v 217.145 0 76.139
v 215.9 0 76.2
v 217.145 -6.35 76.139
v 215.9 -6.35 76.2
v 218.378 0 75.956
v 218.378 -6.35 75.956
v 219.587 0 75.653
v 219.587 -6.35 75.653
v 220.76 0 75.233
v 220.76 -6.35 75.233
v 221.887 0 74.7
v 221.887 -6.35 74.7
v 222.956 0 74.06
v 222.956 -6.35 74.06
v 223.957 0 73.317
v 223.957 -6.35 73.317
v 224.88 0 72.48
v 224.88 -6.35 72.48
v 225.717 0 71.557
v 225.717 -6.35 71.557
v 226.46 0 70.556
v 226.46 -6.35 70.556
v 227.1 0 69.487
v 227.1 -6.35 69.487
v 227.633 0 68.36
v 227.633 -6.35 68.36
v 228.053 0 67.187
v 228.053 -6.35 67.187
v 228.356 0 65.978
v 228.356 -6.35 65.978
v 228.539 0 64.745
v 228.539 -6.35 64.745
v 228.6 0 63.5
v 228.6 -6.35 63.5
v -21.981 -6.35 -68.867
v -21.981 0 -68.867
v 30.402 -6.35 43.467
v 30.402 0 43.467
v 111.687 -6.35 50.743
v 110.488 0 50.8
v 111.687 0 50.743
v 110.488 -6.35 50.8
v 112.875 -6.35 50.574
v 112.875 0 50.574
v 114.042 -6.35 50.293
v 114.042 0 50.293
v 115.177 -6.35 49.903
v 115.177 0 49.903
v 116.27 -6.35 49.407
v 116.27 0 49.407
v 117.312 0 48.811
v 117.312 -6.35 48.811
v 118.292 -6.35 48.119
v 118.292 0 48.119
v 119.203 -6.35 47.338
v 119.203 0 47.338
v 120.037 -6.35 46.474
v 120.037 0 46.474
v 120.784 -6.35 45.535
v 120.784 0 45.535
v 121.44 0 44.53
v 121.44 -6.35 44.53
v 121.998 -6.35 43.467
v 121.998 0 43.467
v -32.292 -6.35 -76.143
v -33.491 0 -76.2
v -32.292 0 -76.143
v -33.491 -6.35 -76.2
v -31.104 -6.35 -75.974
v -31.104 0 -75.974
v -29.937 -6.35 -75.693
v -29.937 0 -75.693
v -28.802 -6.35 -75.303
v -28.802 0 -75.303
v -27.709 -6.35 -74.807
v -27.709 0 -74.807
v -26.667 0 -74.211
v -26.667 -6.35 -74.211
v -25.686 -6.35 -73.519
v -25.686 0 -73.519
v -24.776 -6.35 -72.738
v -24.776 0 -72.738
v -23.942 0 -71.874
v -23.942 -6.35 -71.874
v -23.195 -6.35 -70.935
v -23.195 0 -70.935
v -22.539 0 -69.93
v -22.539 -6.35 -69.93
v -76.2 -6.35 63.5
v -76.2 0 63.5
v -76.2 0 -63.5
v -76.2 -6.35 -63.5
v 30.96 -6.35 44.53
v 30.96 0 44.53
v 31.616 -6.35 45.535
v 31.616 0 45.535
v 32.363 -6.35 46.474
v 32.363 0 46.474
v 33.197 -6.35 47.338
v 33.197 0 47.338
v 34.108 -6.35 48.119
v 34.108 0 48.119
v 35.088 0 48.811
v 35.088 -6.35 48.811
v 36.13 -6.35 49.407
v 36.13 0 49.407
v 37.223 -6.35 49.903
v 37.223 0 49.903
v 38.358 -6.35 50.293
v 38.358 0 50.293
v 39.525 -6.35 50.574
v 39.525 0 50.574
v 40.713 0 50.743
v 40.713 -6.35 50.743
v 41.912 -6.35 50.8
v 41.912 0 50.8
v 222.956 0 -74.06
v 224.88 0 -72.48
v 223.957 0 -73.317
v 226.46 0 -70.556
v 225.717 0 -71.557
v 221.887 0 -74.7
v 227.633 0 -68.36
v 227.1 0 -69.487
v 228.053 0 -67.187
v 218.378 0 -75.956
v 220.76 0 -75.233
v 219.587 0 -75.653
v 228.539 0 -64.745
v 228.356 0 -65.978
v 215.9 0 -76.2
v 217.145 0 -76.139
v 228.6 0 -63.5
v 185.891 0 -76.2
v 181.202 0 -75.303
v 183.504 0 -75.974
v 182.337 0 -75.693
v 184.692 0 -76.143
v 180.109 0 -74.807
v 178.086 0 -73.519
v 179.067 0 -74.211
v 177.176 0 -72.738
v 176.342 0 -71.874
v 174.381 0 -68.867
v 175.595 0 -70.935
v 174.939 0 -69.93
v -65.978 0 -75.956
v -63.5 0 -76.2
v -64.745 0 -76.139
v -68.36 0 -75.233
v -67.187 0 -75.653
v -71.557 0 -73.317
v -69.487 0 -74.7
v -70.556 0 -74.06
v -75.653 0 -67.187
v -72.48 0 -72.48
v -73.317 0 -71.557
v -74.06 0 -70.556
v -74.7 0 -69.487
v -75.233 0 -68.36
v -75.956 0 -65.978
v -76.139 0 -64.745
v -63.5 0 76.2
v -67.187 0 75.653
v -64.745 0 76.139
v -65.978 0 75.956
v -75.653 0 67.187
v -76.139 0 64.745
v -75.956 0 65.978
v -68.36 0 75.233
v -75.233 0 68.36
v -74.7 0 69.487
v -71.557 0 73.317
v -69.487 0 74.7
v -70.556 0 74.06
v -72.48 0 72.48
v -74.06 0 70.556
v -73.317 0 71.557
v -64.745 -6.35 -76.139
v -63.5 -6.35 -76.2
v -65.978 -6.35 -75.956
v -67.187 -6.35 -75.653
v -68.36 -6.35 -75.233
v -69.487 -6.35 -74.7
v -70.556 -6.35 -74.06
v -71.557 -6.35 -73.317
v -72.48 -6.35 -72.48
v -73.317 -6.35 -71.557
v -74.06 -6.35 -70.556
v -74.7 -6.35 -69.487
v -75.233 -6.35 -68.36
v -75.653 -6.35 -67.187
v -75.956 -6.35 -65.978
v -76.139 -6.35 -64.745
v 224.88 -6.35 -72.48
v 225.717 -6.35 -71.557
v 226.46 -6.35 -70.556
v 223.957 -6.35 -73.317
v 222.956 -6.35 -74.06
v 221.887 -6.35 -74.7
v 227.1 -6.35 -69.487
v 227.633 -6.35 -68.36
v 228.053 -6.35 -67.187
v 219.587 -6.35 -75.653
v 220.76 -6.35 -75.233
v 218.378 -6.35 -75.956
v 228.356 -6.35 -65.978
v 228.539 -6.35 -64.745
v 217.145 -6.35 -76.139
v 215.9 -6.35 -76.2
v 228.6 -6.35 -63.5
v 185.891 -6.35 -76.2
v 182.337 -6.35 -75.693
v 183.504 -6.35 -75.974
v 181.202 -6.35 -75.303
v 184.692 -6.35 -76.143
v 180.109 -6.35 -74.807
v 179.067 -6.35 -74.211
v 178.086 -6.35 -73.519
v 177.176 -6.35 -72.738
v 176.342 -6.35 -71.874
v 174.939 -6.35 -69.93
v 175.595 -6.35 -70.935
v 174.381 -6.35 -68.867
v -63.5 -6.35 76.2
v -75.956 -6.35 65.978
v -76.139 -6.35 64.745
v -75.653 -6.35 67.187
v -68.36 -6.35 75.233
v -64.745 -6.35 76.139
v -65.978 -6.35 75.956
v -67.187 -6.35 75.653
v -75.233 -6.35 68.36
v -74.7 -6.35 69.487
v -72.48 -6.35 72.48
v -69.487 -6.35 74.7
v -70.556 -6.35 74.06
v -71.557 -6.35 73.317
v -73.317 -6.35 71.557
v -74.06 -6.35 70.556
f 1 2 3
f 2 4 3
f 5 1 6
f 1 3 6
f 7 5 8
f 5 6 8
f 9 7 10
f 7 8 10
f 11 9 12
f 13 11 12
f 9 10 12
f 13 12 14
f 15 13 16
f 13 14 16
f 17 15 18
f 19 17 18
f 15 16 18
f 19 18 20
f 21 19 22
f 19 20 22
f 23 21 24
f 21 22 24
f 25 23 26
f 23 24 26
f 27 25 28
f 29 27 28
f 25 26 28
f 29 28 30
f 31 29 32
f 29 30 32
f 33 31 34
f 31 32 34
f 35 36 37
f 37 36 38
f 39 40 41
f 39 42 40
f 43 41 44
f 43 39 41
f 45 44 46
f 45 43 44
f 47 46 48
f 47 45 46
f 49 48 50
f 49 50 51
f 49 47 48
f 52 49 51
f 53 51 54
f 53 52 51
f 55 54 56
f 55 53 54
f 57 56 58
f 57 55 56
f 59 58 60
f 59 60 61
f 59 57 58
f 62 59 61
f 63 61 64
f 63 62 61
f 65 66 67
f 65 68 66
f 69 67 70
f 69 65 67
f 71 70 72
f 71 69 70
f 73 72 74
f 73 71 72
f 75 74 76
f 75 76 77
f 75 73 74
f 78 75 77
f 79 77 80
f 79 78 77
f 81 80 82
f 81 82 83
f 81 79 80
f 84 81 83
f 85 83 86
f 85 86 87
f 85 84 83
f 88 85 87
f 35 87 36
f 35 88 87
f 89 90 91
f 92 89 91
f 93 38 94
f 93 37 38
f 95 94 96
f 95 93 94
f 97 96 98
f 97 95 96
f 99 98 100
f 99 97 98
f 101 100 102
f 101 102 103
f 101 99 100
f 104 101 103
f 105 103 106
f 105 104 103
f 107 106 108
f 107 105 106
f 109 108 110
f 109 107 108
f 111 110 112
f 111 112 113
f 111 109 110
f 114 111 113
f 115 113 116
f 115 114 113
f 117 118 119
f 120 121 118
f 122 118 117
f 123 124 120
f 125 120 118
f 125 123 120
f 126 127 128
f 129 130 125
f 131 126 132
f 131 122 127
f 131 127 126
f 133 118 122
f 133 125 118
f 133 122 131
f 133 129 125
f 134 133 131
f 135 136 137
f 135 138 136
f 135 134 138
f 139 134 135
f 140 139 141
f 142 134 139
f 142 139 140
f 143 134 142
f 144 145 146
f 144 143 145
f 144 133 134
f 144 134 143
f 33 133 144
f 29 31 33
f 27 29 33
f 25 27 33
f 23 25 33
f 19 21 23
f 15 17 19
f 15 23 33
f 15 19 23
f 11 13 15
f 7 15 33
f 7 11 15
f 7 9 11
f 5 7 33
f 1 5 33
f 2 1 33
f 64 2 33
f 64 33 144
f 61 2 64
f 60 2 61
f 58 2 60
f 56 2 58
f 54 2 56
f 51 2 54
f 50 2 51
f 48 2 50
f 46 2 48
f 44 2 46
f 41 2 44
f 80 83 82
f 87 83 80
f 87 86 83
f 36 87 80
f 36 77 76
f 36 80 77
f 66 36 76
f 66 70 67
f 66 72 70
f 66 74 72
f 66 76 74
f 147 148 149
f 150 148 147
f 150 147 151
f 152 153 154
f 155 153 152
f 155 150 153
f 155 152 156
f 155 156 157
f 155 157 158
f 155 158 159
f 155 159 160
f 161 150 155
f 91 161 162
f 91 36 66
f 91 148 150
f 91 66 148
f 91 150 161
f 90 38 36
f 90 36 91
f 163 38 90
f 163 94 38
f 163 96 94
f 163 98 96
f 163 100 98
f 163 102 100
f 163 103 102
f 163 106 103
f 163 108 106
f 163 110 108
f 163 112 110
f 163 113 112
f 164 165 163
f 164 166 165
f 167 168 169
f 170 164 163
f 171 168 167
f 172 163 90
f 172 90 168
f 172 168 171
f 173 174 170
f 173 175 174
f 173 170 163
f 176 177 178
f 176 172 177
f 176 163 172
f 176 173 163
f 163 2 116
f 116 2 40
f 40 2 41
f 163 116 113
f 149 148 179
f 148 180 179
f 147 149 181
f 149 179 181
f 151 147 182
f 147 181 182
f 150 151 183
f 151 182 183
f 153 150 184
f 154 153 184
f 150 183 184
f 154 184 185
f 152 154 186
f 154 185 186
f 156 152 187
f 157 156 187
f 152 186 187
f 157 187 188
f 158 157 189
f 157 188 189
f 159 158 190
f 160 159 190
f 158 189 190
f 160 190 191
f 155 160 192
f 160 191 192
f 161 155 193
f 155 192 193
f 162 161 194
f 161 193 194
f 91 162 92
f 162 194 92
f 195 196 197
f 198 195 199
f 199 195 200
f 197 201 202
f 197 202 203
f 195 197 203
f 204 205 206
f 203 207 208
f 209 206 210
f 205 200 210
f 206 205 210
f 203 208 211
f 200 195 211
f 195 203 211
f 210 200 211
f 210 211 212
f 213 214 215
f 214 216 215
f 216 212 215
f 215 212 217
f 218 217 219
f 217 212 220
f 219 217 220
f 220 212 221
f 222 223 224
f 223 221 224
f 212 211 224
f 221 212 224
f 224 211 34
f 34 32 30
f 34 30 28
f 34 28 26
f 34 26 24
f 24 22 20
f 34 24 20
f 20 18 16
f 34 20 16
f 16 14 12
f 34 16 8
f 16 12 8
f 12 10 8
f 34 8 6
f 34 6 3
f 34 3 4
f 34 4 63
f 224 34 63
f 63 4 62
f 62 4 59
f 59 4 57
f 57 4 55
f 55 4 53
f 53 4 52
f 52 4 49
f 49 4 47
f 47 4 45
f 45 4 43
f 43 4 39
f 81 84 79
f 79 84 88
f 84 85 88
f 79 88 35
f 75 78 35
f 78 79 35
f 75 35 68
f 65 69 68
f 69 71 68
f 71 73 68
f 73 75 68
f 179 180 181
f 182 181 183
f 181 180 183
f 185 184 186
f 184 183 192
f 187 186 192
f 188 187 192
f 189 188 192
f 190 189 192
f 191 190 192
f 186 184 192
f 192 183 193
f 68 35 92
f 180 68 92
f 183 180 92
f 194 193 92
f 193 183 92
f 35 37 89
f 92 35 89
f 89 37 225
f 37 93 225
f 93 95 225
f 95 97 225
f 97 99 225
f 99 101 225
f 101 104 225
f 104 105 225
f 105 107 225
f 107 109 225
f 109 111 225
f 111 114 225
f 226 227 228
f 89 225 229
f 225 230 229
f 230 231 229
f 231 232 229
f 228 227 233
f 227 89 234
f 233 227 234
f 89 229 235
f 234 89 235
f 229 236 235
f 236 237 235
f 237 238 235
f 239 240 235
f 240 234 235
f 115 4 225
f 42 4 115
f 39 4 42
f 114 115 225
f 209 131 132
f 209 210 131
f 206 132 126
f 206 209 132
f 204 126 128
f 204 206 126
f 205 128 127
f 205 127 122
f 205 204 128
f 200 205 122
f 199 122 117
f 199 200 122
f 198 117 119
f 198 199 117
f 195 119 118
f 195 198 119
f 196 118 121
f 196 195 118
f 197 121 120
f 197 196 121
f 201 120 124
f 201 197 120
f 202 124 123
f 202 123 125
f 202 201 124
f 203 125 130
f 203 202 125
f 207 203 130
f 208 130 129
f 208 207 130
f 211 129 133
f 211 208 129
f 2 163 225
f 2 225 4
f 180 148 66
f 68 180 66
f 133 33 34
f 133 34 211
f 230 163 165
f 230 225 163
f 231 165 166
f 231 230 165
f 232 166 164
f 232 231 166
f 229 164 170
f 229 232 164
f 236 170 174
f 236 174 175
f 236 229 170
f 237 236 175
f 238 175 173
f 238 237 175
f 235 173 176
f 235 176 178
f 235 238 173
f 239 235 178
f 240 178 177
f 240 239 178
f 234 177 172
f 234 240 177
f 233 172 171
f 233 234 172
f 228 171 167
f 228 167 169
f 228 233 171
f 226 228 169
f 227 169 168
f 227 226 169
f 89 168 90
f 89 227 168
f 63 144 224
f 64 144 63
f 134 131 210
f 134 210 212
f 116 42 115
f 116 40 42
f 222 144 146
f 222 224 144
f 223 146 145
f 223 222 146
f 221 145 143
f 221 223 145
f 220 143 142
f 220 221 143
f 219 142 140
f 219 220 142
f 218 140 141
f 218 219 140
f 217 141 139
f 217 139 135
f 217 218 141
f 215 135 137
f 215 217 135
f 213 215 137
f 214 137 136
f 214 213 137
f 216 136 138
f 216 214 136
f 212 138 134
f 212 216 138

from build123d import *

# Parameters (mm, degrees)
F1_DEPTH = 6.35
F3_R     = 12.7


with BuildPart() as f1:
    # F0 (on Front) → F1 (new body)
    with BuildSketch(Plane.XZ):
        Polygon((76.2, 76.2), (-76.2, 76.2), (-76.2, -76.2), (-25.4, -76.2), (33.8210725857, 50.8), (76.2, 50.8), align=None)
    extrude(amount=F1_DEPTH)

    # F2: F1 across face


with BuildPart() as f1_1:
    add(f1.part)
    add(f1.part.mirror(Plane(origin=(76.2, -3.175, 63.5), x_dir=(0, 1, 0), z_dir=(1, 0, 0))))

    # F3
    f3_edges = [f1_1.edges().sort_by_distance(p)[0] for p in [
        (33.821073, -3.175, 50.8),
        (118.578927, -3.175, 50.8),
        (177.8, -3.175, -76.2),
        (-25.4, -3.175, -76.2),
        (-76.2, -3.175, -76.2),
        (228.6, -3.175, -76.2),
        (228.6, -3.175, 76.2),
        (-76.2, -3.175, 76.2),
    ]]
    fillet(f3_edges, radius=F3_R)


solid = f1_1.part
